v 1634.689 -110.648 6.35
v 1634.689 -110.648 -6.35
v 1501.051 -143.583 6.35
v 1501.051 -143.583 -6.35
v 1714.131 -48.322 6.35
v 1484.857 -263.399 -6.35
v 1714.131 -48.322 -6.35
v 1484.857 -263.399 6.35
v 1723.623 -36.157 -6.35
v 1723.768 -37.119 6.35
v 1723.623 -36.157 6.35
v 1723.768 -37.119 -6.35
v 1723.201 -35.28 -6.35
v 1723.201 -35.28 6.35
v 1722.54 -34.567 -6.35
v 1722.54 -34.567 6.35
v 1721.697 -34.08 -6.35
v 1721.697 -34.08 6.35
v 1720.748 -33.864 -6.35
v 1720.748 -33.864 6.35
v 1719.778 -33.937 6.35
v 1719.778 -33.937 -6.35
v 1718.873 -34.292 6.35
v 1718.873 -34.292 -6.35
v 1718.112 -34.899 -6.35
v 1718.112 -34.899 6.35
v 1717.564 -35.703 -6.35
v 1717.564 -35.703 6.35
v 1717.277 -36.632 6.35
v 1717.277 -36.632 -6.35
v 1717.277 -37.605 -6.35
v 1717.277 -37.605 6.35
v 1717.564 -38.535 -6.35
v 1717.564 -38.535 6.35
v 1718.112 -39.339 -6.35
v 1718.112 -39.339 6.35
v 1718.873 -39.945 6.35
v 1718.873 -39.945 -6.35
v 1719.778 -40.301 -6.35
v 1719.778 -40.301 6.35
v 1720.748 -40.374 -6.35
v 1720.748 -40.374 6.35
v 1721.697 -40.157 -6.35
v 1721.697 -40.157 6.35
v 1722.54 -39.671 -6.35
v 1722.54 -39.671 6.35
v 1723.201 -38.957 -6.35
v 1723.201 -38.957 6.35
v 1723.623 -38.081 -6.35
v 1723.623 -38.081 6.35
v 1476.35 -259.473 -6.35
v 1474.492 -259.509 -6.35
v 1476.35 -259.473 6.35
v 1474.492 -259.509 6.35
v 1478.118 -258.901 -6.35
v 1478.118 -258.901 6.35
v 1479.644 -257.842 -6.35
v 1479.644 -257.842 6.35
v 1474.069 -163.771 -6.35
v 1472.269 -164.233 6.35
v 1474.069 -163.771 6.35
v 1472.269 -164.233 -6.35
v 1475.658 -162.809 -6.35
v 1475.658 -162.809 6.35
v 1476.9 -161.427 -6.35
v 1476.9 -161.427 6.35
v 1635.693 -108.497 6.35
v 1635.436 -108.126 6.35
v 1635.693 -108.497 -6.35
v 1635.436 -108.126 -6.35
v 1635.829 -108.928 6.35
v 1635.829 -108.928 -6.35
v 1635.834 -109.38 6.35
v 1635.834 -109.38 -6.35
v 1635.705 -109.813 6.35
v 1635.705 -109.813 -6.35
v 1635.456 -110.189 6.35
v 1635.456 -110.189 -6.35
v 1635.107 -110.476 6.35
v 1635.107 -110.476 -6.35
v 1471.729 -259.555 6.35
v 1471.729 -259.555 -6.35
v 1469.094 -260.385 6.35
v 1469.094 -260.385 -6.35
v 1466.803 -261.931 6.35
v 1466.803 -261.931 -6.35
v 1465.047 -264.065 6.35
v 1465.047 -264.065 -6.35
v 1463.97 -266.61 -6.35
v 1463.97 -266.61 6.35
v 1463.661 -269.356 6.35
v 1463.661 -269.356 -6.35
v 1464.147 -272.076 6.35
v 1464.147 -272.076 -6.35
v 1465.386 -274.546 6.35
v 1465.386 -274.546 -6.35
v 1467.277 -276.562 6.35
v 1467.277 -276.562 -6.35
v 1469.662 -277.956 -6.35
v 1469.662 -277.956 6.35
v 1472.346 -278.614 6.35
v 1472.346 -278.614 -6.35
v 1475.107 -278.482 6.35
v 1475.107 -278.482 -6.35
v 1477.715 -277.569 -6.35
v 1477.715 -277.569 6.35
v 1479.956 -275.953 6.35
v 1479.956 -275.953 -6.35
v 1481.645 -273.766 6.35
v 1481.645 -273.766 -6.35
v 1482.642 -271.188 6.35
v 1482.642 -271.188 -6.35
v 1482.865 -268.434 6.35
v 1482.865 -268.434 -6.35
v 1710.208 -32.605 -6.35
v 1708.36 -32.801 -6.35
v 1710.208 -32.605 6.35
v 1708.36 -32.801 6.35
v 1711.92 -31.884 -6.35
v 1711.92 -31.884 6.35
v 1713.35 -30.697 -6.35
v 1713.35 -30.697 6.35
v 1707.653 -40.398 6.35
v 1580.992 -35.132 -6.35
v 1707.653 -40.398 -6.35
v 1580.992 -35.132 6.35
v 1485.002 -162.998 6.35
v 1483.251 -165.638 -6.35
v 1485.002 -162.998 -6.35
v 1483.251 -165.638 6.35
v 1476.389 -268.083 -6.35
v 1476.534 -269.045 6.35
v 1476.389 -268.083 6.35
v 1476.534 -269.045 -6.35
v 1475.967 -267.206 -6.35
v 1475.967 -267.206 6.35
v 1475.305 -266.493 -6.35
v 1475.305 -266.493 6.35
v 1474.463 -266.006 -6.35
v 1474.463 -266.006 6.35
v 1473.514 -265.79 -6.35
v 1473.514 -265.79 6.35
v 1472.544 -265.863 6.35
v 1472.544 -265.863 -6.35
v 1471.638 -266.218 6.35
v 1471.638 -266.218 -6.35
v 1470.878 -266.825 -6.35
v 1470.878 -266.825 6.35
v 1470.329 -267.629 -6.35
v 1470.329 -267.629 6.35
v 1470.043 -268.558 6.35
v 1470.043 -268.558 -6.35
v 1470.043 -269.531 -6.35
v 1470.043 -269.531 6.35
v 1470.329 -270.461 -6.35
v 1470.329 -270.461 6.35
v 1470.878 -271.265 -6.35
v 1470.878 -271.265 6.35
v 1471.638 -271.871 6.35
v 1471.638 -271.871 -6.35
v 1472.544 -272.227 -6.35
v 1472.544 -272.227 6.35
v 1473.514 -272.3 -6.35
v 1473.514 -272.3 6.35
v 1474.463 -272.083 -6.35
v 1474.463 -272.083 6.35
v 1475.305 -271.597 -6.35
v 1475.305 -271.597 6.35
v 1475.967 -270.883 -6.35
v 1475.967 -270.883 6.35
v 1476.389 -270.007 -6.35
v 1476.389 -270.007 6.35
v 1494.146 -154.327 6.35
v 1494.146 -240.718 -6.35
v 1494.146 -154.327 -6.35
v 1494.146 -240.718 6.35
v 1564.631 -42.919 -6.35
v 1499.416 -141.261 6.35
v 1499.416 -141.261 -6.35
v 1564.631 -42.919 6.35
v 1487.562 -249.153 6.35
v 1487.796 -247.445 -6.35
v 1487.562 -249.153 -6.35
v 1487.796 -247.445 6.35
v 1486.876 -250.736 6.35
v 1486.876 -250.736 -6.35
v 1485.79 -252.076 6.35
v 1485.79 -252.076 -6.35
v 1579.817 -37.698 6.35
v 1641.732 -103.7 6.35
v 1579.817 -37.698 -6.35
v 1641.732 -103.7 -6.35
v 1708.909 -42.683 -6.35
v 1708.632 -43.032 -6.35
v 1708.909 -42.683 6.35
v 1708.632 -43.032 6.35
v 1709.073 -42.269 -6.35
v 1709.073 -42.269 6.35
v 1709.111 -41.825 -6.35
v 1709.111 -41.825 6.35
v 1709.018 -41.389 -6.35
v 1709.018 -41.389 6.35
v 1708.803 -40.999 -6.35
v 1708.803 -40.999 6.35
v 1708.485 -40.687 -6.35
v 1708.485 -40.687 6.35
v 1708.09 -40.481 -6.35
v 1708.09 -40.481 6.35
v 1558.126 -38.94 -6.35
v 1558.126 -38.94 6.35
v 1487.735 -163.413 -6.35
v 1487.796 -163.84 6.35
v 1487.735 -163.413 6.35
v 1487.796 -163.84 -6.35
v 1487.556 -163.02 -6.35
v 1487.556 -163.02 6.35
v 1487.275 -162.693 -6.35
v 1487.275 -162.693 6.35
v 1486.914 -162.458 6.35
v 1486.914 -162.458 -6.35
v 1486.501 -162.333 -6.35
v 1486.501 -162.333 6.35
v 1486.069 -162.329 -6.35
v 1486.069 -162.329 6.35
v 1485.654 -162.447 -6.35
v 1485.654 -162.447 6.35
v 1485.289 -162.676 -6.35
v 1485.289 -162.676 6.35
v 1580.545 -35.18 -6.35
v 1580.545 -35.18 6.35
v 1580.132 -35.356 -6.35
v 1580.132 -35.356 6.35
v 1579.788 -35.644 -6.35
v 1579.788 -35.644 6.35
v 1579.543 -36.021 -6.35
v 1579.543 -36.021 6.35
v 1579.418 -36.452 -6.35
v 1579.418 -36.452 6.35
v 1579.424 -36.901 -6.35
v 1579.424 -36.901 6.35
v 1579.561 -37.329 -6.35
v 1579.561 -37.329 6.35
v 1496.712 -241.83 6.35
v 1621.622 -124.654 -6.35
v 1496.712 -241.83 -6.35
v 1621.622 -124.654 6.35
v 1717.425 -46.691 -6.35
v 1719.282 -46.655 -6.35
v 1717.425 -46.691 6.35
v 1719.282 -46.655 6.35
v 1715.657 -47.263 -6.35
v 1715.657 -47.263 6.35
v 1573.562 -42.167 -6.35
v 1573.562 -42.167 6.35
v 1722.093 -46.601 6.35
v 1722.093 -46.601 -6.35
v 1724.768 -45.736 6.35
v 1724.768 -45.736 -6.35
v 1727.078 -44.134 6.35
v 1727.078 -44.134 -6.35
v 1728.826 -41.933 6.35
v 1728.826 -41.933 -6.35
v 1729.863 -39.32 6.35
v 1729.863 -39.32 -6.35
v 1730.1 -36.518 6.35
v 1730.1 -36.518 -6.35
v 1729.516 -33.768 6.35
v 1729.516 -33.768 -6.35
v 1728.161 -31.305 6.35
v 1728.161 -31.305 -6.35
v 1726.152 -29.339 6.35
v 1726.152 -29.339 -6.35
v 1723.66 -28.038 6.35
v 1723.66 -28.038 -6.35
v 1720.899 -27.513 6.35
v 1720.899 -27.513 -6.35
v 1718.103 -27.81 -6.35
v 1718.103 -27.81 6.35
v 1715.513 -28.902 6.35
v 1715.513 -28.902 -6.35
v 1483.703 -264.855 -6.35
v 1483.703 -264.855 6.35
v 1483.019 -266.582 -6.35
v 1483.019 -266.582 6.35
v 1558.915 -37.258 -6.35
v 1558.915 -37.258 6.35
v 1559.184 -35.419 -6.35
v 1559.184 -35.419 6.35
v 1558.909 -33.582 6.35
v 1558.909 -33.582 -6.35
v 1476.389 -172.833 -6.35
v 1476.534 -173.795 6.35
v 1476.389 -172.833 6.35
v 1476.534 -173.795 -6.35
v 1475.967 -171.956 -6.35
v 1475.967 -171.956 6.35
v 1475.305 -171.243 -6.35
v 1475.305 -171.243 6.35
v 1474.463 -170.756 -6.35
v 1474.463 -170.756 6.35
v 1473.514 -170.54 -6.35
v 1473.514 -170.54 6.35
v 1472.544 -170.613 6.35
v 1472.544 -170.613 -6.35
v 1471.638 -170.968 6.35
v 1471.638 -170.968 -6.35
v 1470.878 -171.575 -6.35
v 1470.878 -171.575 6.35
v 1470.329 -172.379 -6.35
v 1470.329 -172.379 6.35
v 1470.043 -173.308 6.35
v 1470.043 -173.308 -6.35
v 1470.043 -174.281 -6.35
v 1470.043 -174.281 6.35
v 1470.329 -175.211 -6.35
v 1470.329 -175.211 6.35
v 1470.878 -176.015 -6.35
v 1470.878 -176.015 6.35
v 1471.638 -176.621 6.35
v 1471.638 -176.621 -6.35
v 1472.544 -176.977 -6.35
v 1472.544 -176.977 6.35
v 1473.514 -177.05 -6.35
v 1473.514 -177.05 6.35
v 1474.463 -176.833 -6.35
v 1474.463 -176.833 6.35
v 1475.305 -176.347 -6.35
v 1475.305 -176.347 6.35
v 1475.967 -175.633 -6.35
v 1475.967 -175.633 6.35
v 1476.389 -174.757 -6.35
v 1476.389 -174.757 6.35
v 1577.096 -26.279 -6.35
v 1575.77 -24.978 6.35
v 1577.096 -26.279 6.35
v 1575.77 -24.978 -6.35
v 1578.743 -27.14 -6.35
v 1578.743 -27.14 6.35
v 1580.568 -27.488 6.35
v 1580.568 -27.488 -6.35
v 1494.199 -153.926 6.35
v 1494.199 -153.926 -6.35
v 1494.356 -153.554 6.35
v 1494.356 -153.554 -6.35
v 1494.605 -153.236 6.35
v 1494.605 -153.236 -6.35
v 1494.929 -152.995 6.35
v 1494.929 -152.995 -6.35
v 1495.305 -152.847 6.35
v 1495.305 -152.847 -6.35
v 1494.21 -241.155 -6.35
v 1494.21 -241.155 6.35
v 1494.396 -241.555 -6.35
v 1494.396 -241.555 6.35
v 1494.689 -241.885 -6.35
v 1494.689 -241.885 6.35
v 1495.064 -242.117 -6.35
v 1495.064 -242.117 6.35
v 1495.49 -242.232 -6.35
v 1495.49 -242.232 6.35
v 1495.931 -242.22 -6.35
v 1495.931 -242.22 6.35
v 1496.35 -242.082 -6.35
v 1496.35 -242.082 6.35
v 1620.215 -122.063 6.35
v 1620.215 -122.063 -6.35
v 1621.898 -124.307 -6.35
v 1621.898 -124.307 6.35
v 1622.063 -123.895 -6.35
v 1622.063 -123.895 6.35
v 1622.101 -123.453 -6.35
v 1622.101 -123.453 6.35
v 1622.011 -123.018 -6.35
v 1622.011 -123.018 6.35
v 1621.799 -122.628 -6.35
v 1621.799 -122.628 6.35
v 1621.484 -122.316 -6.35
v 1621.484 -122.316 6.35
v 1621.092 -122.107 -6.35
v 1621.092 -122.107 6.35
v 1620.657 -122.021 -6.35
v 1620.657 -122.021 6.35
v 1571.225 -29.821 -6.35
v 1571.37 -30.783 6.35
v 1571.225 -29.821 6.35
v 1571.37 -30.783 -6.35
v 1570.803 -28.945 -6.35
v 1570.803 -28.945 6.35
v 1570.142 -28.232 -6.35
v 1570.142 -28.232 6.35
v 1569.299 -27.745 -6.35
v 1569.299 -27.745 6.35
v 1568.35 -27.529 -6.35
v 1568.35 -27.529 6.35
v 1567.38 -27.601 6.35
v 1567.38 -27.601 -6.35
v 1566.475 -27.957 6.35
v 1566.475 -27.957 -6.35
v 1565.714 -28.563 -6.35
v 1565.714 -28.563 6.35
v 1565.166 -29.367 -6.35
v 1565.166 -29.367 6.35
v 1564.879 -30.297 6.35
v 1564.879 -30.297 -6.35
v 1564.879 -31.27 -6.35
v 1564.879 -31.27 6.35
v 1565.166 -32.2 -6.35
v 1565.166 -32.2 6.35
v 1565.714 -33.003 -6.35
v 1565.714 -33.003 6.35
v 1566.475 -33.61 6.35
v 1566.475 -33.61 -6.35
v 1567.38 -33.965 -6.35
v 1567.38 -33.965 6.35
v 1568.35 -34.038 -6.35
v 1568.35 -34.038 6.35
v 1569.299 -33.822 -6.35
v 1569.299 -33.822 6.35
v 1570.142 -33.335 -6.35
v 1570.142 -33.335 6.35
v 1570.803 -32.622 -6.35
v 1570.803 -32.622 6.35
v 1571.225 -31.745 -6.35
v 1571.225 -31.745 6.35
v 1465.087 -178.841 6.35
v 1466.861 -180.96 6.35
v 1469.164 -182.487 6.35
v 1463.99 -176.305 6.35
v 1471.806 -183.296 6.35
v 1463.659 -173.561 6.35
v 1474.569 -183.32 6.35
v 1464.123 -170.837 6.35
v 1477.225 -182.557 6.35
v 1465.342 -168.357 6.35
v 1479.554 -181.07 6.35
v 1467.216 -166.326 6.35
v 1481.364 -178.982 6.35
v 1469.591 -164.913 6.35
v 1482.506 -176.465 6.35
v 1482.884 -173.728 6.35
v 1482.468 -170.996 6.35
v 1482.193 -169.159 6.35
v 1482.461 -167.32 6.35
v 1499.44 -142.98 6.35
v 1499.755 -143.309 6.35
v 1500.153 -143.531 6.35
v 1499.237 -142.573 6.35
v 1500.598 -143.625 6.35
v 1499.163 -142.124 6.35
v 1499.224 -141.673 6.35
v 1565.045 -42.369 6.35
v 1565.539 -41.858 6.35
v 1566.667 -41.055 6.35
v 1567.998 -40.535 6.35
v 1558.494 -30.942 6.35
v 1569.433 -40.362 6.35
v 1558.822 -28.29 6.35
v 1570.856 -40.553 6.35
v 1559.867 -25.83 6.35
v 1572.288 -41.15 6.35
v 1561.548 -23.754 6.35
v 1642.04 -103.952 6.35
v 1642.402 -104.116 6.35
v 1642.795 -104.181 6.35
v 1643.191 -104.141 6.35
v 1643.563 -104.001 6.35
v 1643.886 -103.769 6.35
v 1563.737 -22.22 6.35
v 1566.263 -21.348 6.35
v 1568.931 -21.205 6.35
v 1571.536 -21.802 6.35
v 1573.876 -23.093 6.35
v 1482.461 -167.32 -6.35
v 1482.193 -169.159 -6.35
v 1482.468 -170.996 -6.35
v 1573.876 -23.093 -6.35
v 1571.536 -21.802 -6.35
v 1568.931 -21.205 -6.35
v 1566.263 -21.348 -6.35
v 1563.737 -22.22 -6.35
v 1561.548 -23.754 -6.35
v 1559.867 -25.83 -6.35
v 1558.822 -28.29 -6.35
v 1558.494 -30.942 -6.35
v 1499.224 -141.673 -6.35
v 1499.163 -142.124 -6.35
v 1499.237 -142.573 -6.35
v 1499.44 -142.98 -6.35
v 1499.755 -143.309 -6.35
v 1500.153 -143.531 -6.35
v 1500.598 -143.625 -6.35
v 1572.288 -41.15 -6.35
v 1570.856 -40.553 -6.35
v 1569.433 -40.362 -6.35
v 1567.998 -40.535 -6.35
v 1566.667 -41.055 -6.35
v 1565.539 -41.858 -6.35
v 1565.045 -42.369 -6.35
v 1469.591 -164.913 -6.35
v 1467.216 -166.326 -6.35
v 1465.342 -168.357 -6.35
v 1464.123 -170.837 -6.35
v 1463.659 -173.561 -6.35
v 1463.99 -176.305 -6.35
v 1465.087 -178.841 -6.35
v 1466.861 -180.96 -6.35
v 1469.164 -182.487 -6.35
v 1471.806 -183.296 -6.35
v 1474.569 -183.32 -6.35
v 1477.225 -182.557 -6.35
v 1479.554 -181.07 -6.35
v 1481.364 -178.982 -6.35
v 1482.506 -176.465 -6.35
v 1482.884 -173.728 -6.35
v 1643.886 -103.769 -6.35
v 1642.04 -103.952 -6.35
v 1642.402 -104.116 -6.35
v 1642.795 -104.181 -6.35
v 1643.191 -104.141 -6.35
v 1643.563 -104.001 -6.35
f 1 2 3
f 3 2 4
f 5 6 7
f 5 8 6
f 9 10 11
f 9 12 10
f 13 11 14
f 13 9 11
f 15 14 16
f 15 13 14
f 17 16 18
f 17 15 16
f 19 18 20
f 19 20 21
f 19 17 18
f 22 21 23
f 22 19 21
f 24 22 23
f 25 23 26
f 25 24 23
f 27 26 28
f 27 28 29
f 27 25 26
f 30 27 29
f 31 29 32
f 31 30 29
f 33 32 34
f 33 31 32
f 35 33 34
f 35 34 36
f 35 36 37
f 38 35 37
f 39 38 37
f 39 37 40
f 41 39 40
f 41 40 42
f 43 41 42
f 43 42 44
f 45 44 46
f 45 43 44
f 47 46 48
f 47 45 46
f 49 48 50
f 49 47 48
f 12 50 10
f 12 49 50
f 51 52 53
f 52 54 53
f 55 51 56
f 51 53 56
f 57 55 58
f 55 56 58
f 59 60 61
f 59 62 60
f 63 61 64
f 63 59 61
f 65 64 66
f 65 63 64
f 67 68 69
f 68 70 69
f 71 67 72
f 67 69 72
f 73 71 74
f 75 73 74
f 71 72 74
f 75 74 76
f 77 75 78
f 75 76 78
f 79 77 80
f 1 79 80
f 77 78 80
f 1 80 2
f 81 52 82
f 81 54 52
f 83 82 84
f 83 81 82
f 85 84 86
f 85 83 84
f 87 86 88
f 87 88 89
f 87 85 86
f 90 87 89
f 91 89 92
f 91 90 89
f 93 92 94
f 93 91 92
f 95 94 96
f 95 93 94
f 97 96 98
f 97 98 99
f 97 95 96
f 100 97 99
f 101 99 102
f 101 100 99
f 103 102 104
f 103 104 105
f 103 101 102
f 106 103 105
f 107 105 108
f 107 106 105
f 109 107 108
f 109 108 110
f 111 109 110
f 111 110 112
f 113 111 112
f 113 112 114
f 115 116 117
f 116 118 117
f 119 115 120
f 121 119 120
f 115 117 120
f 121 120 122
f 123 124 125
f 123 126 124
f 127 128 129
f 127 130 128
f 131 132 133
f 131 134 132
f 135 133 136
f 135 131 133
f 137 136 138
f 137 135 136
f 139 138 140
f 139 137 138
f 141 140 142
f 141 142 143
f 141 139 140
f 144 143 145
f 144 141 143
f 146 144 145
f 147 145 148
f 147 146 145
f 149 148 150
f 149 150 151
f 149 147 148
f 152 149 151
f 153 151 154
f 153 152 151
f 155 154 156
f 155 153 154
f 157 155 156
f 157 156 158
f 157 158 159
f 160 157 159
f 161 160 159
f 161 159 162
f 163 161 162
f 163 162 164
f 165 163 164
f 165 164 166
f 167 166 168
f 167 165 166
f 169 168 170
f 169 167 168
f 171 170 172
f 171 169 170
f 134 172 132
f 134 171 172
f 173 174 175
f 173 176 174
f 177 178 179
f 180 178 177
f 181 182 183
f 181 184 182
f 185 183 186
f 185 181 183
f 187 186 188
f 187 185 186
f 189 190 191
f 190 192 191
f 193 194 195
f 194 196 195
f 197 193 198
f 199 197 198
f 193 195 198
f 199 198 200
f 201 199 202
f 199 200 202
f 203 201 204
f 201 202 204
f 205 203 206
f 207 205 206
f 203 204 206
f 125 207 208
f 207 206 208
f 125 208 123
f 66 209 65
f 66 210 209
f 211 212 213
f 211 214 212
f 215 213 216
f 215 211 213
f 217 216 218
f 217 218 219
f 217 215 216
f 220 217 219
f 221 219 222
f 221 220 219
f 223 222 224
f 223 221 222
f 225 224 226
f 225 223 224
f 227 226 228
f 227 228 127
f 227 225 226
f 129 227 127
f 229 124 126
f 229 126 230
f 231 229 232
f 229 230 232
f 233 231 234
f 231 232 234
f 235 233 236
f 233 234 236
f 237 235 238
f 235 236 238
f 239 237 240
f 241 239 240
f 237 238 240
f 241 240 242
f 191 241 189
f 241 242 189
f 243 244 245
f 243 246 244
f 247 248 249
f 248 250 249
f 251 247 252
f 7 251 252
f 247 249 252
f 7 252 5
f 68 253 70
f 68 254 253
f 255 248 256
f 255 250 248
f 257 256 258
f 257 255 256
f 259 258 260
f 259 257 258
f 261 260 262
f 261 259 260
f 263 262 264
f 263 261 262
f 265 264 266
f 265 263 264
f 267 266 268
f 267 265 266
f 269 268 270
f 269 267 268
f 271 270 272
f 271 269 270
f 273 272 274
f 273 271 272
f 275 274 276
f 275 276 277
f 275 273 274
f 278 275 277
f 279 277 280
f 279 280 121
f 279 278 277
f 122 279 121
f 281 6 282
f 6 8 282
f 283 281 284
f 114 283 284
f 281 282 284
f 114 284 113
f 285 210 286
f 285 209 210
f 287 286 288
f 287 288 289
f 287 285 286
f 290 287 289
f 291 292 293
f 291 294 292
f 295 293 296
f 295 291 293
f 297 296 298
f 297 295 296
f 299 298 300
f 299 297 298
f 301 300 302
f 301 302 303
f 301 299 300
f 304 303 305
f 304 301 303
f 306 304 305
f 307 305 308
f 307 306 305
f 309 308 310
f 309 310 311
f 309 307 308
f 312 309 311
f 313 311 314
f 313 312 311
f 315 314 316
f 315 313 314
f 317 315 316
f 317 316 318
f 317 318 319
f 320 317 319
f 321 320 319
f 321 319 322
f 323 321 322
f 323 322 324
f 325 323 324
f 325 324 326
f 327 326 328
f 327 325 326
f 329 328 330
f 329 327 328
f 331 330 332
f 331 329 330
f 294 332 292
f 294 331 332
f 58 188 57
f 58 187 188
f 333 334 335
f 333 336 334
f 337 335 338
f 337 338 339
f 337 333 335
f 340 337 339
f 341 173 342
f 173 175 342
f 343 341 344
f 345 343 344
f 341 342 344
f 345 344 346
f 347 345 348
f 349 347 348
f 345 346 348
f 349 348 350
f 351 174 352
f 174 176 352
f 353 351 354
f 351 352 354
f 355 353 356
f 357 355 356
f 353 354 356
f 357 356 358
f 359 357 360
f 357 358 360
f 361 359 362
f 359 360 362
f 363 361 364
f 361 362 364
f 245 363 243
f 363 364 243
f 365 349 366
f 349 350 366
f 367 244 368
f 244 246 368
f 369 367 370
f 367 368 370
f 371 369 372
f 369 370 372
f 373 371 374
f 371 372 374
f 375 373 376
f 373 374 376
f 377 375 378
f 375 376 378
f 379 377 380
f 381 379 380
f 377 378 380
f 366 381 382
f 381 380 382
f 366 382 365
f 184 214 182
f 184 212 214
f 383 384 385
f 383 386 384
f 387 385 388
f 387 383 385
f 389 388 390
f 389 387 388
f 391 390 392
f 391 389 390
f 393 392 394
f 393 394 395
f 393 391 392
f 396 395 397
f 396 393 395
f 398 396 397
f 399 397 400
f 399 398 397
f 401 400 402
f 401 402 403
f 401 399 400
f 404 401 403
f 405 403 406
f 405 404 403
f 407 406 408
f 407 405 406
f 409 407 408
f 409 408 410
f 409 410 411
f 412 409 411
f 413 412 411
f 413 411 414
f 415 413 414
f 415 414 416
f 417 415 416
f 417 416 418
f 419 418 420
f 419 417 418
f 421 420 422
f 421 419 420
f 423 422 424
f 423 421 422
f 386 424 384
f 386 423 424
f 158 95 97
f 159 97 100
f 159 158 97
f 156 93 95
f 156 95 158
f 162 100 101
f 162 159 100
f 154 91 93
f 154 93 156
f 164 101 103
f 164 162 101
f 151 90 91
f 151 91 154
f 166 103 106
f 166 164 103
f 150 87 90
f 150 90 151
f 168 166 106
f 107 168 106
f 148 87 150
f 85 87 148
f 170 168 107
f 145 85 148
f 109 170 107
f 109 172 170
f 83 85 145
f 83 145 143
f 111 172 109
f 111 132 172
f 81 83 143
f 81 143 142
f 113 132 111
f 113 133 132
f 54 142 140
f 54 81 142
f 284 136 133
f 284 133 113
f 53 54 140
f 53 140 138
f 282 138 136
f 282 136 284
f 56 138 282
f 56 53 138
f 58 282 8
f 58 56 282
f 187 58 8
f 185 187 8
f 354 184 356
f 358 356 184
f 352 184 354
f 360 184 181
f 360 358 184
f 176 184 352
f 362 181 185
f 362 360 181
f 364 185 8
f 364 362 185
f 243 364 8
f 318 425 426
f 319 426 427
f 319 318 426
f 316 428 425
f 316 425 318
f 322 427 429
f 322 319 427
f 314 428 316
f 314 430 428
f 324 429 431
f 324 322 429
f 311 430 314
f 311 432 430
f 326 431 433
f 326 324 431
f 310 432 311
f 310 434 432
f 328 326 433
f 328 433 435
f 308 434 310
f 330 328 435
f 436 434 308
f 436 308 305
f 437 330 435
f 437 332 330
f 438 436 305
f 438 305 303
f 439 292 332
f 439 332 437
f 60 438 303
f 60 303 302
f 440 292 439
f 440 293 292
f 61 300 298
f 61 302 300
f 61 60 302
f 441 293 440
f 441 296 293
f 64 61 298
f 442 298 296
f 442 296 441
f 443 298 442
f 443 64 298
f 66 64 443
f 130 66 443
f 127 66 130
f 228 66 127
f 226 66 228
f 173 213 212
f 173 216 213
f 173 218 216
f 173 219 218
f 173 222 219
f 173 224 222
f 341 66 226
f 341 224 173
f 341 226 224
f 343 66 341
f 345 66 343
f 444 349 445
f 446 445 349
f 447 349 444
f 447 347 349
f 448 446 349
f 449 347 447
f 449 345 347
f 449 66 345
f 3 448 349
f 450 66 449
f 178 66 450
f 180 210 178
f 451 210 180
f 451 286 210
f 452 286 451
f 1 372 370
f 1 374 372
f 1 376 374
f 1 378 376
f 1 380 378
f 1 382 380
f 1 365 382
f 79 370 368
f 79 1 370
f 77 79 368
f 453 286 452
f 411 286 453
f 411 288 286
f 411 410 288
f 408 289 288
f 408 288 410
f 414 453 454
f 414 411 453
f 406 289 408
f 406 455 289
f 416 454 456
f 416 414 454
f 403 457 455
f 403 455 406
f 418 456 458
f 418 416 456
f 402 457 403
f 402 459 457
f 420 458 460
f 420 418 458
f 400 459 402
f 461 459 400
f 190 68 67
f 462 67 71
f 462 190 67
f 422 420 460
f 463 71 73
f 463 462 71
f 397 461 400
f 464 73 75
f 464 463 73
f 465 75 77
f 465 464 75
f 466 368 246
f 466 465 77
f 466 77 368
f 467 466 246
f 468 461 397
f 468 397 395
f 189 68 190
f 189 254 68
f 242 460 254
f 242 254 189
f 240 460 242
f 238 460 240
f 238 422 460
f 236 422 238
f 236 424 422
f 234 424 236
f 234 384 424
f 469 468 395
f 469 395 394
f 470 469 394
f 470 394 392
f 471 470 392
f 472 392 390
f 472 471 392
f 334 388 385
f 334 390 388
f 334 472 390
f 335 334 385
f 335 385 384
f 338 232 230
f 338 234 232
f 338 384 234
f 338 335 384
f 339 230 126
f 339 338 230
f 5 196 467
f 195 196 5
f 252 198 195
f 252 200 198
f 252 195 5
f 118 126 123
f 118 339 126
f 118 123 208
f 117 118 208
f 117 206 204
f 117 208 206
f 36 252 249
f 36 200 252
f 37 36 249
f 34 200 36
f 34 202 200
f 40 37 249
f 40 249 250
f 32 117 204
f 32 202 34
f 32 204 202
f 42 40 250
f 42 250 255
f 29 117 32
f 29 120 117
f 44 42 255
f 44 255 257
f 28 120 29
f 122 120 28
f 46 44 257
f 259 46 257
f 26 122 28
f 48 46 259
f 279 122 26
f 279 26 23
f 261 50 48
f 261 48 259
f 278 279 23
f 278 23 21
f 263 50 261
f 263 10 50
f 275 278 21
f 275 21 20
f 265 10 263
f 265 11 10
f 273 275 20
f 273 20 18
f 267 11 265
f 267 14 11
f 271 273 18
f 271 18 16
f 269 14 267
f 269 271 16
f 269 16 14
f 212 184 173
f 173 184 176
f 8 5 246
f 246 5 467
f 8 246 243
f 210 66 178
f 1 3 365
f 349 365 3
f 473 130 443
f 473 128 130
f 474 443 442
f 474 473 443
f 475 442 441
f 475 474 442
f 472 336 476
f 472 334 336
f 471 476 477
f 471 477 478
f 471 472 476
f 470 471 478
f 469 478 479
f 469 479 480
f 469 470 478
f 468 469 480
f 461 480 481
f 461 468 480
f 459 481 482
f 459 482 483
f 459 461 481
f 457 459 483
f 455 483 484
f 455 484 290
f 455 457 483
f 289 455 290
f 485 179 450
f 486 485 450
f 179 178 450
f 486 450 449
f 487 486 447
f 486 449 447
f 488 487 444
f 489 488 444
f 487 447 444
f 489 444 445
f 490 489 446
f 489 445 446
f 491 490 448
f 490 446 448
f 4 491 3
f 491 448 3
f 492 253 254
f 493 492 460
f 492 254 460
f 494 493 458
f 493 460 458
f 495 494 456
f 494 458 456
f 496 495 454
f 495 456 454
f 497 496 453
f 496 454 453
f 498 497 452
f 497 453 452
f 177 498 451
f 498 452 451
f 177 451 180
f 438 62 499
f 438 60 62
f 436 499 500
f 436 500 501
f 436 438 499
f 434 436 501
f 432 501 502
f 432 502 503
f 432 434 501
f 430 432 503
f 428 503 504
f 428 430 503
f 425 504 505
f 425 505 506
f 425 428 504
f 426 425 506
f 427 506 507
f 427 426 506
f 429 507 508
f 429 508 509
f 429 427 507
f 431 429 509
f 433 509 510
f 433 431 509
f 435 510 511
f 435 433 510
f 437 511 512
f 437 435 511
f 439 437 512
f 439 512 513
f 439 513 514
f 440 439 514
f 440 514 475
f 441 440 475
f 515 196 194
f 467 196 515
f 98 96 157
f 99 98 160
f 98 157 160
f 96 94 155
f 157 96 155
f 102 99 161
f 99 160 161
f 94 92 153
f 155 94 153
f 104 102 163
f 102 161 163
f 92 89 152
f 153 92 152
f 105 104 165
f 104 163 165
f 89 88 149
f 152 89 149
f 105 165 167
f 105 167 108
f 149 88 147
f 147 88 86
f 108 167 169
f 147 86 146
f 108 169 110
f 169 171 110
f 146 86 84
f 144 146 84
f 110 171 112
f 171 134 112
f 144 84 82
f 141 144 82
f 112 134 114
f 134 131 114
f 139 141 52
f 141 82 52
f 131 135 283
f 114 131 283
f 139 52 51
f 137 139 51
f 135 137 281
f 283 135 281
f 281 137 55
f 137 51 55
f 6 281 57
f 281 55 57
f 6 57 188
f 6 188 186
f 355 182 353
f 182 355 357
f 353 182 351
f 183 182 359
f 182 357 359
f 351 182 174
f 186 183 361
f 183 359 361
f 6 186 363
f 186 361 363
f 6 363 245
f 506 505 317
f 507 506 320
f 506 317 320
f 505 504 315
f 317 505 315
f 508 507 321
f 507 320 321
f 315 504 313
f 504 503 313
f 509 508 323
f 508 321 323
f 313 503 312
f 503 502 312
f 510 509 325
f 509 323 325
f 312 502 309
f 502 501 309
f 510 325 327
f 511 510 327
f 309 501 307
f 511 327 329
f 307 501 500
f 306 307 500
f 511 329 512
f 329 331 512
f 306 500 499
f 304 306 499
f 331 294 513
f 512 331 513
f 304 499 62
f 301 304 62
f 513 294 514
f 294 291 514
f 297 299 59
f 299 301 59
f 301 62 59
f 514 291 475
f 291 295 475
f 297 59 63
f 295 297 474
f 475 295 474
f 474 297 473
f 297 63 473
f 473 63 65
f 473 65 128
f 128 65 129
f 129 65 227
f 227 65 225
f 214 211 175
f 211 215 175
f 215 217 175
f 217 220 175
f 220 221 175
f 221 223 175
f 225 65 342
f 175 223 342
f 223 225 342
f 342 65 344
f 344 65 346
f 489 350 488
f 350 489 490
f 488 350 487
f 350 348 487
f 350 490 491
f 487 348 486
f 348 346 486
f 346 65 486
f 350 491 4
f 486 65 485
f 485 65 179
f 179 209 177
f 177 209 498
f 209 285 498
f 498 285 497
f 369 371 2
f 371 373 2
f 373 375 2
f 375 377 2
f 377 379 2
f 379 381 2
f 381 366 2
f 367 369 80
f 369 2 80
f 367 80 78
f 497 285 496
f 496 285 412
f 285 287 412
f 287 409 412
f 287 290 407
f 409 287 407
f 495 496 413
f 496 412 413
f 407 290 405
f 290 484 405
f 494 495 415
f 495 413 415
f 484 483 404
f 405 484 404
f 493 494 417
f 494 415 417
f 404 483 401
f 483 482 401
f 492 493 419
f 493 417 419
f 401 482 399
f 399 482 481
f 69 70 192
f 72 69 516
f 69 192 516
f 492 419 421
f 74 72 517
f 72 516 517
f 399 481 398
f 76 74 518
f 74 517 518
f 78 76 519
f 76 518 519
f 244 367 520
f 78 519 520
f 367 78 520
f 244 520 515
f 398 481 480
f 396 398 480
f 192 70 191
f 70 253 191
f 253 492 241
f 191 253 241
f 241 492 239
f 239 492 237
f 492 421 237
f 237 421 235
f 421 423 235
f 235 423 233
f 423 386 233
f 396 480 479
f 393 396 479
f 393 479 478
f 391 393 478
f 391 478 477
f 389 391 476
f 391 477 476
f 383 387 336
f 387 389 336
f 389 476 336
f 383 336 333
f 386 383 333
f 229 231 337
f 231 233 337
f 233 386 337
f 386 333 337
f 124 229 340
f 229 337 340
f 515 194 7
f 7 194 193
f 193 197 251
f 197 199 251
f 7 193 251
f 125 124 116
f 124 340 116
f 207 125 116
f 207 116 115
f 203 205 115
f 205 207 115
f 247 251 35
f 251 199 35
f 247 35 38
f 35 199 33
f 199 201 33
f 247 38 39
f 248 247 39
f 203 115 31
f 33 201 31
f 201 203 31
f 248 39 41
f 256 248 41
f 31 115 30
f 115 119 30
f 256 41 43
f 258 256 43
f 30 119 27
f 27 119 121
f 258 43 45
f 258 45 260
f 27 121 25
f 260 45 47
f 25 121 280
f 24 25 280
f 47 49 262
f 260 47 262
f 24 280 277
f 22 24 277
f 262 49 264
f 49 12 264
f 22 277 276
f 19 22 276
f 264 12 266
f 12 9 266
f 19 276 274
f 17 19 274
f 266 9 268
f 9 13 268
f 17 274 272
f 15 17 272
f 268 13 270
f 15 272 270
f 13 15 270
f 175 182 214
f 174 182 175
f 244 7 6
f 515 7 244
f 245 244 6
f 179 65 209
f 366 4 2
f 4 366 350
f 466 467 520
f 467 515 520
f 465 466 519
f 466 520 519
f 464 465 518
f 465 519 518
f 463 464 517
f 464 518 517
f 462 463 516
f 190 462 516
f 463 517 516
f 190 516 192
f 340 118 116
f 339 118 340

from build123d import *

# Parameters (mm, degrees)
SKETCH1_R           = 3.2639
BOSS_EXTRUDE1_DEPTH = 6.35
FILLET1_R           = 6.35
FILLET2_R           = 1.524
FILLET3_R           = 5.715


with BuildPart() as part:
    # Sketch1 → Boss-Extrude1 (new, symmetric)
    with BuildSketch(Plane.XY):
        with BuildLine():
            Line((1487.79576568, -158.784269308), (1487.79576568, -250.194499736))
            Line((1487.79576568, -250.194499736), (1477.101010284, -260.227049093))
            ThreePointArc((1477.101010284, -260.227049093), (1466.258468724, -275.622237688), (1482.314360626, -265.784510583))
            Line((1482.314360626, -265.784510583), (1716.673663322, -45.936446331))
            ThreePointArc((1716.673663322, -45.936446331), (1729.515779421, -33.768446492), (1711.843687849, -32.945436509))
            Line((1711.843687849, -32.945436509), (1577.08389596, -27.343328807))
            ThreePointArc((1577.08389596, -27.343328807), (1563.736723174, -22.220026544), (1560.05306912, -36.03400281))
            Line((1560.05306912, -36.03400281), (1474.973065059, -164.332851502))
            ThreePointArc((1474.973065059, -164.332851502), (1467.95688272, -181.806995965), (1481.323608223, -168.54414602))
            Line((1481.323608223, -168.54414602), (1487.79576568, -158.784269308))
        make_face()
        with Locations((1473.270132637, -269.04472734)):
            Circle(SKETCH1_R, mode=Mode.SUBTRACT)
        with Locations((1473.270132637, -173.79472734)):
            Circle(SKETCH1_R, mode=Mode.SUBTRACT)
        Polygon((1494.14576568, -153.132601519), (1625.870376064, -120.66929862), (1494.14576568, -244.23768389), align=None, mode=Mode.SUBTRACT)
        with BuildLine():
            Line((1571.366761462, -39.827649479), (1637.217429421, -110.024840786))
            Line((1637.217429421, -110.024840786), (1497.256271331, -144.518026652))
            Line((1497.256271331, -144.518026652), (1566.403612284, -40.245297328))
            ThreePointArc((1566.403612284, -40.245297328), (1568.912702914, -40.363462312), (1571.366761462, -39.827649479))
        make_face(mode=Mode.SUBTRACT)
        with Locations((1568.106544706, -30.78342149)):
            Circle(SKETCH1_R, mode=Mode.SUBTRACT)
        Polygon((1642.774890911, -104.811490444), (1577.264872597, -34.97743362), (1711.279538853, -40.548565657), align=None, mode=Mode.SUBTRACT)
        with Locations((1720.504540969, -37.118768084)):
            Circle(SKETCH1_R, mode=Mode.SUBTRACT)
    extrude(amount=BOSS_EXTRUDE1_DEPTH, both=True)

    # Fillet1
    fillet1_edges = [part.edges().sort_by_distance(p)[0] for p in [
        (1577.08389596, -27.343328807, 0),
        (1711.843687849, -32.945436509, 0),
        (1716.673663322, -45.936446331, 0),
        (1482.314360626, -265.784510583, 0),
        (1477.101010284, -260.227049093, 0),
        (1487.79576568, -250.194499736, 0),
        (1481.323608223, -168.54414602, 0),
        (1474.973065059, -164.332851502, 0),
        (1560.05306912, -36.03400281, 0),
    ]]
    fillet(fillet1_edges, radius=FILLET1_R)

    # Fillet2
    fillet2_edges = [part.edges().sort_by_distance(p)[0] for p in [
        (1494.14576568, -244.23768389, 0),
        (1625.870376064, -120.66929862, 0),
        (1494.14576568, -153.132601519, 0),
        (1642.774890911, -104.811490444, 0),
        (1711.279538853, -40.548565657, 0),
        (1577.264872597, -34.97743362, 0),
        (1497.256271331, -144.518026652, 0),
        (1637.217429421, -110.024840786, 0),
        (1487.79576568, -158.784269308, 0),
    ]]
    fillet(fillet2_edges, radius=FILLET2_R)

    # Fillet3
    fillet3_edges = [part.edges().sort_by_distance(p)[0] for p in [
        (1571.366761462, -39.827649479, 0),
    ]]
    fillet(fillet3_edges, radius=FILLET3_R)
    fillet3_2_edges = [part.edges().sort_by_distance(p)[0] for p in [
        (1566.403612284, -40.245297328, 0),
    ]]
    fillet(fillet3_2_edges, radius=FILLET3_R - 0.0001)  # a hair under: the kernel refuses the full size


solid = part.part
